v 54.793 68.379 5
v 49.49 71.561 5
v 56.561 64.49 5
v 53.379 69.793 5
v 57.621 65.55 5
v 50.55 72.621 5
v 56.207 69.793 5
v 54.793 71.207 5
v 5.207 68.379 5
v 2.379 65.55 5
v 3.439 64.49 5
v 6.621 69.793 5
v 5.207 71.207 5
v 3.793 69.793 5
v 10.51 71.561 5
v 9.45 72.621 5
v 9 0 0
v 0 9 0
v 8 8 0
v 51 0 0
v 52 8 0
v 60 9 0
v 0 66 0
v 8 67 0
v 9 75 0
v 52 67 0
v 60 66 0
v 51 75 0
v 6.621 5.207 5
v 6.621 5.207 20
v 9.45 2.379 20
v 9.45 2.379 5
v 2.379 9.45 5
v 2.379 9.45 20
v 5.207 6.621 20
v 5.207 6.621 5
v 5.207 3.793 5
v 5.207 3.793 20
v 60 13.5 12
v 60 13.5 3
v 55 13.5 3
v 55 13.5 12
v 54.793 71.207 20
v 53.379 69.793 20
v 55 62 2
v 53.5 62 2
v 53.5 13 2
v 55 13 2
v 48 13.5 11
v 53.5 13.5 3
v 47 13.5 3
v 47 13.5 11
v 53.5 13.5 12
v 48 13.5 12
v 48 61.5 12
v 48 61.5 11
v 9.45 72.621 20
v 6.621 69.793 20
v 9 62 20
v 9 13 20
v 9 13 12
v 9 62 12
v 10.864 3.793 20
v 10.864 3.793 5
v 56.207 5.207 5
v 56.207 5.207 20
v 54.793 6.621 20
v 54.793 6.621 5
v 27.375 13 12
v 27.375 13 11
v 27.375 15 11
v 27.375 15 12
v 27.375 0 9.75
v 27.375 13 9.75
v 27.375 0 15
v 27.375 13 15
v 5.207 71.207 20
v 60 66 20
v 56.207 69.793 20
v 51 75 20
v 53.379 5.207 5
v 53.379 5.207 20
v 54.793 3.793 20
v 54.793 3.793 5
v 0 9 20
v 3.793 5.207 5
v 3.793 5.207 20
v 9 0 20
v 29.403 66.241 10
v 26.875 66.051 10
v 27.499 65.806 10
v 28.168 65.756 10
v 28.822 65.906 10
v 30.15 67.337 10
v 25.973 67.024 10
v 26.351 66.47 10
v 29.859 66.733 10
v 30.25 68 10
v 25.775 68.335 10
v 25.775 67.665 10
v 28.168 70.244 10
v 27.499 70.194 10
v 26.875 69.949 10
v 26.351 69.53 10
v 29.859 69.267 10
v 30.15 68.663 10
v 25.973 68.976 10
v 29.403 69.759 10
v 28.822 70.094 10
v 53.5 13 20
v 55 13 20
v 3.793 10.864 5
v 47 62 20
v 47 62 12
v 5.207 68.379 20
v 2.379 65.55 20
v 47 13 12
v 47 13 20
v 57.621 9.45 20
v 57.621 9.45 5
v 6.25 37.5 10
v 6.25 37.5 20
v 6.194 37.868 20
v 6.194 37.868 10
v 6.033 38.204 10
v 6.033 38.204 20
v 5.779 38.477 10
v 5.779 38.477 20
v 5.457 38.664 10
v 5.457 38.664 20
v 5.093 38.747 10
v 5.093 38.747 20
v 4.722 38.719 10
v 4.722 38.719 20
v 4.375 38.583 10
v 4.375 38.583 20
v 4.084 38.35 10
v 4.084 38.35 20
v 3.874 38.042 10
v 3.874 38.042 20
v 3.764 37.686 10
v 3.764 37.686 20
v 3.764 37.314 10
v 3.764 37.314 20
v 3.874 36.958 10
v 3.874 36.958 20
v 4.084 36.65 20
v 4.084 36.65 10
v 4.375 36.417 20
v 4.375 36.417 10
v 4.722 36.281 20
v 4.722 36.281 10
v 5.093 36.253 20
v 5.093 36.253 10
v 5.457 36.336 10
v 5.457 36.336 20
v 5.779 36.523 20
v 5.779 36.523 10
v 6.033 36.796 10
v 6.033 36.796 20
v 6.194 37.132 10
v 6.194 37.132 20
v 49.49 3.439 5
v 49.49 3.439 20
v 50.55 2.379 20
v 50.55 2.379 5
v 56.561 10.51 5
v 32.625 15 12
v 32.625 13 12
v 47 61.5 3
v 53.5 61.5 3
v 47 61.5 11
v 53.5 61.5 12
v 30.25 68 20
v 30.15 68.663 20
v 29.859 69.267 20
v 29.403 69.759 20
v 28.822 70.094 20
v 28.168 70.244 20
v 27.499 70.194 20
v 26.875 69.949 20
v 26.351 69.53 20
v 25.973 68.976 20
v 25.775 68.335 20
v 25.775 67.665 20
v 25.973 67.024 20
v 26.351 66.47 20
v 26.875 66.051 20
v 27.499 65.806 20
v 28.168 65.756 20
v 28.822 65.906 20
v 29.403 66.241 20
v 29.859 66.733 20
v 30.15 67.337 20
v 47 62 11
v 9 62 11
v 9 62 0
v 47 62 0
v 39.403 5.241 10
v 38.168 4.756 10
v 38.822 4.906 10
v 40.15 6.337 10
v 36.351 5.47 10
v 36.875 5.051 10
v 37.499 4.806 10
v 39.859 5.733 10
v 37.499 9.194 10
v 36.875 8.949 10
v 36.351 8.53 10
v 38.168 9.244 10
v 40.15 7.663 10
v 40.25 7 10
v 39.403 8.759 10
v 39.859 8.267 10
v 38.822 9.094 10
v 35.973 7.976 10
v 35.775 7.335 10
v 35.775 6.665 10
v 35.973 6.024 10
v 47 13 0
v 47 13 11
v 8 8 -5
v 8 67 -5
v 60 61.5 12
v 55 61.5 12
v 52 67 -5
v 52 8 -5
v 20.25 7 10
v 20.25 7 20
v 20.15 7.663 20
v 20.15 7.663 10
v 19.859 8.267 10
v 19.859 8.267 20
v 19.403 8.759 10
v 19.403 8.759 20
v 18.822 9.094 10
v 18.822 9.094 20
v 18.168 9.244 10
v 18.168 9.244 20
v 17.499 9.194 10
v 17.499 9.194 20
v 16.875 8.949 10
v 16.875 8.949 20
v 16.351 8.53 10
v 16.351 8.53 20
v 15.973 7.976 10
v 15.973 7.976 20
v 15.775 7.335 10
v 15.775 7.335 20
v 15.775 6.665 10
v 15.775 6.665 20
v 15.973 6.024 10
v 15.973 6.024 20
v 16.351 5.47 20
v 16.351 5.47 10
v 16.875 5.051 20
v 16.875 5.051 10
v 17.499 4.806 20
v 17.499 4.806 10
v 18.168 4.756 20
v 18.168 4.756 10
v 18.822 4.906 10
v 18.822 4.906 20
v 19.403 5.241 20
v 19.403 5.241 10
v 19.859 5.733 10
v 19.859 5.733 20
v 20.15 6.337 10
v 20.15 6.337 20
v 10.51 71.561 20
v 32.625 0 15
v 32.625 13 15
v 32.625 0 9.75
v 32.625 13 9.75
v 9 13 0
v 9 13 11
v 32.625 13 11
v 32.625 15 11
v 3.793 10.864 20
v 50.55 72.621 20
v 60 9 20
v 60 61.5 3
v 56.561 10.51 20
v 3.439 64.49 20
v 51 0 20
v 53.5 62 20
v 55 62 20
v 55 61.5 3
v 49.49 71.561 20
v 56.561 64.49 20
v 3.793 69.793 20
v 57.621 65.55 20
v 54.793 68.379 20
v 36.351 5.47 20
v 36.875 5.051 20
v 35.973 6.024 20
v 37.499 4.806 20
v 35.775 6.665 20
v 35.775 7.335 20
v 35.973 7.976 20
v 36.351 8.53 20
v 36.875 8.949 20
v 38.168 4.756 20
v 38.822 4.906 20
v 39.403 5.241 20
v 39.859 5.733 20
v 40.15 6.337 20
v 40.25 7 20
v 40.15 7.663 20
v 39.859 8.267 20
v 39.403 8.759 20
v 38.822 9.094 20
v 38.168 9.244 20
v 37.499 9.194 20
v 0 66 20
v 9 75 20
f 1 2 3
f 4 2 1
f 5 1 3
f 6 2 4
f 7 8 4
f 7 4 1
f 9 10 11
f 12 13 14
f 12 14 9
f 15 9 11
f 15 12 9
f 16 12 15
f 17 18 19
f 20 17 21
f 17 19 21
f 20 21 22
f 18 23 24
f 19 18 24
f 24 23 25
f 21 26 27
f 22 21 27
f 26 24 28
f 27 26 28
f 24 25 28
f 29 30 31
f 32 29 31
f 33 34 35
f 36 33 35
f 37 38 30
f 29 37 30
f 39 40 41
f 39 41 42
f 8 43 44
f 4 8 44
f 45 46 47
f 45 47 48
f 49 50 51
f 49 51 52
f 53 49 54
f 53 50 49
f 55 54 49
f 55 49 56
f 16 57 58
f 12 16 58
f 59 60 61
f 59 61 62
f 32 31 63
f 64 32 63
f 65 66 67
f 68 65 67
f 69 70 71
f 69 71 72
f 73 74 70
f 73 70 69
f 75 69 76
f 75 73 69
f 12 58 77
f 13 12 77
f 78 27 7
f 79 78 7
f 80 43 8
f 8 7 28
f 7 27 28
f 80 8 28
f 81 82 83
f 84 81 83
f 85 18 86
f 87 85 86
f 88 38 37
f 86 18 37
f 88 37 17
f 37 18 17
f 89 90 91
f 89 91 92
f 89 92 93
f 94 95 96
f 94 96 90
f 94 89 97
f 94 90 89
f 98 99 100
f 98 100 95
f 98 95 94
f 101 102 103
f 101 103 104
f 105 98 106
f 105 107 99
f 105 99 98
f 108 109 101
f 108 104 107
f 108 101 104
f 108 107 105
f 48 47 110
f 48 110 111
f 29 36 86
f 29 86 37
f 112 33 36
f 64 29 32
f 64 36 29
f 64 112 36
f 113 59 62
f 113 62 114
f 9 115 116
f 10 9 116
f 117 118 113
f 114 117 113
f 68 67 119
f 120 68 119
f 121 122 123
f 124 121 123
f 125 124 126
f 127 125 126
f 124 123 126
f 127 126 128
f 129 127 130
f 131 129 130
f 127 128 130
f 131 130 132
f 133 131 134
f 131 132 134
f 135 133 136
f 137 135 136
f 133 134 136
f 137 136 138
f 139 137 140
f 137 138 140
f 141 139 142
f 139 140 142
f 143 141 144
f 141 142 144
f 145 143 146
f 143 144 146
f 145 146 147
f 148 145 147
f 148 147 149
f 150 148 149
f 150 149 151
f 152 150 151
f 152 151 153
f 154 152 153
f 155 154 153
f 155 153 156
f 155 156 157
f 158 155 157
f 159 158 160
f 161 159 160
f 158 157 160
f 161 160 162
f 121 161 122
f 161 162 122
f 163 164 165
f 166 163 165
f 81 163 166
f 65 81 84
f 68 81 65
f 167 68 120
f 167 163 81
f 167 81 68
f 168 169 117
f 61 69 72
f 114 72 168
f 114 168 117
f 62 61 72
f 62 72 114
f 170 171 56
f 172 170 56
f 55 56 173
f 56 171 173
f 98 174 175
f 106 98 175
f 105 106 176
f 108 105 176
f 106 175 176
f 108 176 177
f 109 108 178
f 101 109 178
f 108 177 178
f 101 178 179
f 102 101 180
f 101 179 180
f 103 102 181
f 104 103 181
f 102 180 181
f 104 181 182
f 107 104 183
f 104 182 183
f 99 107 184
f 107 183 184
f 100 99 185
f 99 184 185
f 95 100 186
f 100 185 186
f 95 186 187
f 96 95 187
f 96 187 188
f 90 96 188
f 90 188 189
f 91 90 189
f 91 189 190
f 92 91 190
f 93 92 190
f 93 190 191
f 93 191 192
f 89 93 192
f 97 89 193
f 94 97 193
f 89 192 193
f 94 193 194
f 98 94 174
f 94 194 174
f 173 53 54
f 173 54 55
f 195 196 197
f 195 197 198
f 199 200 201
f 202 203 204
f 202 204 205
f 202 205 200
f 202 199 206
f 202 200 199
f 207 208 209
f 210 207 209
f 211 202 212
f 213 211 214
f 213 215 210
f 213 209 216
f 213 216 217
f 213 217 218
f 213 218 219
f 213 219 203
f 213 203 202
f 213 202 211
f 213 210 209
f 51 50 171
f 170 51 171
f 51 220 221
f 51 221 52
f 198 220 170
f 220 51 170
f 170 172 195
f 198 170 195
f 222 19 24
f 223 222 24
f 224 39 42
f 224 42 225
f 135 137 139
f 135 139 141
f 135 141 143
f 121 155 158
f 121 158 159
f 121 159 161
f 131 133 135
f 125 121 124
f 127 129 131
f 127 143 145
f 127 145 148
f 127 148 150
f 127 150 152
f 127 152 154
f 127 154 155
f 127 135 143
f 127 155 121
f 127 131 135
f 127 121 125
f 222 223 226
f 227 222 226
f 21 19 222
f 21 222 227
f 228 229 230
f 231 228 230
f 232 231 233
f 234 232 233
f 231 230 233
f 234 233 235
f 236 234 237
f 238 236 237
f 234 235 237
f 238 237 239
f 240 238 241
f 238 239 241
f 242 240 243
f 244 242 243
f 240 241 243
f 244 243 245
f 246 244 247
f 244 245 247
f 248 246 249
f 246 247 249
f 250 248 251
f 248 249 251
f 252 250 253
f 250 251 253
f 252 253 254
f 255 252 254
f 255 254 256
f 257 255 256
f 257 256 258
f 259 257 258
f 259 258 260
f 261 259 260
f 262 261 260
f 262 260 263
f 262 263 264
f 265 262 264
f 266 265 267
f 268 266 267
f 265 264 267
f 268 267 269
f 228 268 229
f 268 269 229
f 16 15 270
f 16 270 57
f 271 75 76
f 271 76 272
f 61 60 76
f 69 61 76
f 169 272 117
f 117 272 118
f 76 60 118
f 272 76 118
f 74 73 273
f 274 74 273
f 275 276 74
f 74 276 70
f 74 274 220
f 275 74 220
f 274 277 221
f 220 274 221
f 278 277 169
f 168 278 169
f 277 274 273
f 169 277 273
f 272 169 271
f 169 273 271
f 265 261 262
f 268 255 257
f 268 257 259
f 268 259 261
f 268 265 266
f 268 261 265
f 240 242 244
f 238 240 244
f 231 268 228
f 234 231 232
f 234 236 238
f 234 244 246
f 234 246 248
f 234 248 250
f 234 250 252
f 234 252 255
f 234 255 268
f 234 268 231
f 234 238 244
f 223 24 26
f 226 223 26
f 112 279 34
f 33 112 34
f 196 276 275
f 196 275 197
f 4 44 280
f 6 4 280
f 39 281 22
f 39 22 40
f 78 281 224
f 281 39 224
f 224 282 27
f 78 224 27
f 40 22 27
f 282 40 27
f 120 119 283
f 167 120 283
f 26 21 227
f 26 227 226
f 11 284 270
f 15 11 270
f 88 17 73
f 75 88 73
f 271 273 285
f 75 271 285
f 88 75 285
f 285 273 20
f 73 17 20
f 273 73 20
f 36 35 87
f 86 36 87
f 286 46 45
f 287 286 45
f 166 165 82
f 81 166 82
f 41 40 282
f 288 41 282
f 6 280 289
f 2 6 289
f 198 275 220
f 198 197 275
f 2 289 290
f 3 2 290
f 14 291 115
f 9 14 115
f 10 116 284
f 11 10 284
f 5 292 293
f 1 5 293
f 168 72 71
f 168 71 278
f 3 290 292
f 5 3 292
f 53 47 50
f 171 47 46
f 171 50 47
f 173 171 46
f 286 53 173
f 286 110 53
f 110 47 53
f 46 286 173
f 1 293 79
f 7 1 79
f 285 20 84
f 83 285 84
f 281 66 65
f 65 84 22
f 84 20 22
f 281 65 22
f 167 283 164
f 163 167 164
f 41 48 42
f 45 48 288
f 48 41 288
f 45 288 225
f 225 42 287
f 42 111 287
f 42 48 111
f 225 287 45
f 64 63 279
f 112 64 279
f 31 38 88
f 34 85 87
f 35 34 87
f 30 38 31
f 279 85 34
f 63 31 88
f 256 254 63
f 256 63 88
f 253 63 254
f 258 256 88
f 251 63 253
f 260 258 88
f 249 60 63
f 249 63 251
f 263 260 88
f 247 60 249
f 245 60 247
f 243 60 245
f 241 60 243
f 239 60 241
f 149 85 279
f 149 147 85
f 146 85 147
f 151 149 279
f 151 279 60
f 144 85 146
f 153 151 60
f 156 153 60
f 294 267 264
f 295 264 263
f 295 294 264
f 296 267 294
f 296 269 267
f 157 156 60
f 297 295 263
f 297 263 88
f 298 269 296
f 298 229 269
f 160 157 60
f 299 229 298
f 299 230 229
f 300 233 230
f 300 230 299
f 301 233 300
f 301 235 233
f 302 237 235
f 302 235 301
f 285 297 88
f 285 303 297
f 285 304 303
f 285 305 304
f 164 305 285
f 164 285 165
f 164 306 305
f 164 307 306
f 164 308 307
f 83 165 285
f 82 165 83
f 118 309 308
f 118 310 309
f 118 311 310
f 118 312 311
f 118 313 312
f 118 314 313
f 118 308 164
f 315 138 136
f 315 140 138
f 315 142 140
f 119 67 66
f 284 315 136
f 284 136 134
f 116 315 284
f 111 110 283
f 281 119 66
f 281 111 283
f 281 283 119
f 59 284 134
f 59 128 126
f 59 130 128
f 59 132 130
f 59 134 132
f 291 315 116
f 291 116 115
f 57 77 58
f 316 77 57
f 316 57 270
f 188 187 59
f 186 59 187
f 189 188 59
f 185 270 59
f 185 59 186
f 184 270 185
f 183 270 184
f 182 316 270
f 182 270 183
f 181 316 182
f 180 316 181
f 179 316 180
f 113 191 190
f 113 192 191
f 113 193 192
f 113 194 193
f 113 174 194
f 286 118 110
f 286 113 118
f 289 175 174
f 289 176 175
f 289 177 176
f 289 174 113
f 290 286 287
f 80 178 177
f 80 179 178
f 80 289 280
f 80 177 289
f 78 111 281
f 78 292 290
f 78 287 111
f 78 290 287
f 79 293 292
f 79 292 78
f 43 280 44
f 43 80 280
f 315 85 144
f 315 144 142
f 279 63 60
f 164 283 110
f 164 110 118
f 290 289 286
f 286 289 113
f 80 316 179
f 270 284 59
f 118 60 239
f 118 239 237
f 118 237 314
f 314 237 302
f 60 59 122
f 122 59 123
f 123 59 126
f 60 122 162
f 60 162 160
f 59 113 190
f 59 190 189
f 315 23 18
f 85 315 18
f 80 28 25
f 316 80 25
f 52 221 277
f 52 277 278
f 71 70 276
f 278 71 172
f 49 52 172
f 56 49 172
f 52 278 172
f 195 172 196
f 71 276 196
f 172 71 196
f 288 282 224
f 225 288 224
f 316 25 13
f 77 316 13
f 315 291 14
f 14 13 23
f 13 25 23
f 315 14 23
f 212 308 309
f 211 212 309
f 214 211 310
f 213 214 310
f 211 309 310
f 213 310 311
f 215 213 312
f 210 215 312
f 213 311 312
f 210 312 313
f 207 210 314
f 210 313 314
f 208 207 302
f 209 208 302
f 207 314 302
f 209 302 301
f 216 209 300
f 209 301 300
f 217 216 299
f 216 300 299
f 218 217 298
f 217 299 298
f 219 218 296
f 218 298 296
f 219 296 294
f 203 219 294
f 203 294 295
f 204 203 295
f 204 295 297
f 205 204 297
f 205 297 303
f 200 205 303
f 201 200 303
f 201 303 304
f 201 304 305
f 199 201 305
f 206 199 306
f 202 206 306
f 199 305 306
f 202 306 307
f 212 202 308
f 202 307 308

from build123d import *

# Parameters (mm, degrees)
F1_DEPTH  = 20
F2_DEPTH  = 20
F4_DEPTH  = 15
F5_W      = 44
F5_H      = 59
F5_W_2    = 34
F5_H_2    = 49
F7_DEPTH  = 25
F8_DEPTH  = 20
F6_W      = 48
F6_H      = 9
F9_DEPTH  = 45
F10_W     = 1.5
F10_H     = 49
F11_DEPTH = 18
F12_W     = 49
F12_H     = 20
F13_DEPTH = 4
F14_W     = 49
F14_H     = 1
F15_DEPTH = 39
F16_R     = 2.25
F16_R_2   = 1.25
F17_DEPTH = 10
F18_W     = 5.25
F18_H     = 5.25
F19_DEPTH = 15


with BuildPart() as f1:
    # F0 (on Top) → F1 (new body)
    with BuildSketch(Plane.XY):
        Polygon((0, 66), (0, 9), (9, 0), (51, 0), (60, 9), (60, 66), (51, 75), (9, 75), align=None)
    extrude(amount=F1_DEPTH)

    # F0 (on Top) → F2 (join)
    with BuildSketch(Plane.XY):
        Polygon((0, 66), (0, 9), (9, 0), (51, 0), (60, 9), (60, 66), (51, 75), (9, 75), align=None)
    extrude(amount=F2_DEPTH)

    # F3 (on face) → F4 (cut)
    with BuildSketch(Plane.XY.offset(20)):
        Polygon((5.2071067812, 71.2071067812), (3.7928932188, 69.7928932188), (5.2071067812, 68.3786796564), (6.6213203436, 69.7928932188), align=None)
        Polygon((6.6213203436, 69.7928932188), (5.2071067812, 68.3786796564), (2.3786796564, 65.5502525317), (3.4393398282, 64.4895923599), (10.5104076401, 71.5606601718), (9.4497474683, 72.6213203436), align=None)
        Polygon((2.3786796564, 9.4497474683), (5.2071067812, 6.6213203436), (6.6213203436, 5.2071067812), (9.4497474683, 2.3786796564), (10.8639610307, 3.7928932188), (3.7928932188, 10.8639610307), align=None)
        Polygon((5.2071067812, 6.6213203436), (3.7928932188, 5.2071067812), (5.2071067812, 3.7928932188), (6.6213203436, 5.2071067812), align=None)
        Polygon((53.3786796564, 5.2071067812), (54.7928932188, 3.7928932188), (56.2071067812, 5.2071067812), (54.7928932188, 6.6213203436), align=None)
        Polygon((50.5502525317, 2.3786796564), (53.3786796564, 5.2071067812), (54.7928932188, 6.6213203436), (57.6213203436, 9.4497474683), (56.5606601718, 10.5104076401), (49.4895923599, 3.4393398282), align=None)
        Polygon((54.7928932188, 68.3786796564), (53.3786796564, 69.7928932188), (50.5502525317, 72.6213203436), (49.4895923599, 71.5606601718), (56.5606601718, 64.4895923599), (57.6213203436, 65.5502525317), align=None)
        Polygon((56.2071067812, 69.7928932188), (54.7928932188, 71.2071067812), (53.3786796564, 69.7928932188), (54.7928932188, 68.3786796564), align=None)
    extrude(amount=-F4_DEPTH, mode=Mode.SUBTRACT)

    # F5 (on face) → F7 (join)
    with BuildSketch(Plane.XY.offset(20)):
        with Locations((30, 37.5)):
            Rectangle(F5_W, F5_H)
        with Locations((30, 37.5)):
            Rectangle(F5_W_2, F5_H_2, mode=Mode.SUBTRACT)
        with Locations((30, 37.5)):
            Rectangle(F5_W_2, F5_H_2)
    extrude(amount=-F7_DEPTH)

    # F5 (on face) → F8 (cut)
    with BuildSketch(Plane.XY.offset(20)):
        with Locations((30, 37.5)):
            Rectangle(F5_W_2, F5_H_2)
    extrude(amount=-F8_DEPTH, mode=Mode.SUBTRACT)

    # F6 (on face) → F9 (cut)
    with BuildSketch(Plane.YZ.offset(60)):
        with Locations((37.5, 7.5)):
            Rectangle(F6_W, F6_H)
    extrude(amount=-F9_DEPTH, mode=Mode.SUBTRACT)

    # F10 (on face) → F11 (cut)
    with BuildSketch(Plane.XY.offset(20)):
        with Locations((54.25, 37.5)):
            Rectangle(F10_W, F10_H)
    extrude(amount=-F11_DEPTH, mode=Mode.SUBTRACT)

    # F12 (on face) → F13 (cut)
    with BuildSketch(Plane.YZ.offset(13)):
        with Locations((37.5, 10)):
            Rectangle(F12_W, F12_H)
    extrude(amount=-F13_DEPTH, mode=Mode.SUBTRACT)

    # F14 (on face) → F15 (join)
    with BuildSketch(Plane.YZ.offset(9)):
        with Locations((37.5, 11.5)):
            Rectangle(F14_W, F14_H)
    extrude(amount=F15_DEPTH)

    # F16 (on face) → F17 (cut)
    with BuildSketch(Plane.XY.offset(20)):
        with Locations((18, 7)):
            Circle(F16_R)
        with Locations((28, 68)):
            Circle(F16_R)
        with Locations((5, 37.5)):
            Circle(F16_R_2)
        with Locations((38, 7)):
            Circle(F16_R)
    extrude(amount=-F17_DEPTH, mode=Mode.SUBTRACT)

    # F18 (on face) → F19 (cut)
    with BuildSketch(Plane.XZ):
        with Locations((30, 12.375)):
            Rectangle(F18_W, F18_H)
    extrude(amount=-F19_DEPTH, mode=Mode.SUBTRACT)


solid = f1.part
